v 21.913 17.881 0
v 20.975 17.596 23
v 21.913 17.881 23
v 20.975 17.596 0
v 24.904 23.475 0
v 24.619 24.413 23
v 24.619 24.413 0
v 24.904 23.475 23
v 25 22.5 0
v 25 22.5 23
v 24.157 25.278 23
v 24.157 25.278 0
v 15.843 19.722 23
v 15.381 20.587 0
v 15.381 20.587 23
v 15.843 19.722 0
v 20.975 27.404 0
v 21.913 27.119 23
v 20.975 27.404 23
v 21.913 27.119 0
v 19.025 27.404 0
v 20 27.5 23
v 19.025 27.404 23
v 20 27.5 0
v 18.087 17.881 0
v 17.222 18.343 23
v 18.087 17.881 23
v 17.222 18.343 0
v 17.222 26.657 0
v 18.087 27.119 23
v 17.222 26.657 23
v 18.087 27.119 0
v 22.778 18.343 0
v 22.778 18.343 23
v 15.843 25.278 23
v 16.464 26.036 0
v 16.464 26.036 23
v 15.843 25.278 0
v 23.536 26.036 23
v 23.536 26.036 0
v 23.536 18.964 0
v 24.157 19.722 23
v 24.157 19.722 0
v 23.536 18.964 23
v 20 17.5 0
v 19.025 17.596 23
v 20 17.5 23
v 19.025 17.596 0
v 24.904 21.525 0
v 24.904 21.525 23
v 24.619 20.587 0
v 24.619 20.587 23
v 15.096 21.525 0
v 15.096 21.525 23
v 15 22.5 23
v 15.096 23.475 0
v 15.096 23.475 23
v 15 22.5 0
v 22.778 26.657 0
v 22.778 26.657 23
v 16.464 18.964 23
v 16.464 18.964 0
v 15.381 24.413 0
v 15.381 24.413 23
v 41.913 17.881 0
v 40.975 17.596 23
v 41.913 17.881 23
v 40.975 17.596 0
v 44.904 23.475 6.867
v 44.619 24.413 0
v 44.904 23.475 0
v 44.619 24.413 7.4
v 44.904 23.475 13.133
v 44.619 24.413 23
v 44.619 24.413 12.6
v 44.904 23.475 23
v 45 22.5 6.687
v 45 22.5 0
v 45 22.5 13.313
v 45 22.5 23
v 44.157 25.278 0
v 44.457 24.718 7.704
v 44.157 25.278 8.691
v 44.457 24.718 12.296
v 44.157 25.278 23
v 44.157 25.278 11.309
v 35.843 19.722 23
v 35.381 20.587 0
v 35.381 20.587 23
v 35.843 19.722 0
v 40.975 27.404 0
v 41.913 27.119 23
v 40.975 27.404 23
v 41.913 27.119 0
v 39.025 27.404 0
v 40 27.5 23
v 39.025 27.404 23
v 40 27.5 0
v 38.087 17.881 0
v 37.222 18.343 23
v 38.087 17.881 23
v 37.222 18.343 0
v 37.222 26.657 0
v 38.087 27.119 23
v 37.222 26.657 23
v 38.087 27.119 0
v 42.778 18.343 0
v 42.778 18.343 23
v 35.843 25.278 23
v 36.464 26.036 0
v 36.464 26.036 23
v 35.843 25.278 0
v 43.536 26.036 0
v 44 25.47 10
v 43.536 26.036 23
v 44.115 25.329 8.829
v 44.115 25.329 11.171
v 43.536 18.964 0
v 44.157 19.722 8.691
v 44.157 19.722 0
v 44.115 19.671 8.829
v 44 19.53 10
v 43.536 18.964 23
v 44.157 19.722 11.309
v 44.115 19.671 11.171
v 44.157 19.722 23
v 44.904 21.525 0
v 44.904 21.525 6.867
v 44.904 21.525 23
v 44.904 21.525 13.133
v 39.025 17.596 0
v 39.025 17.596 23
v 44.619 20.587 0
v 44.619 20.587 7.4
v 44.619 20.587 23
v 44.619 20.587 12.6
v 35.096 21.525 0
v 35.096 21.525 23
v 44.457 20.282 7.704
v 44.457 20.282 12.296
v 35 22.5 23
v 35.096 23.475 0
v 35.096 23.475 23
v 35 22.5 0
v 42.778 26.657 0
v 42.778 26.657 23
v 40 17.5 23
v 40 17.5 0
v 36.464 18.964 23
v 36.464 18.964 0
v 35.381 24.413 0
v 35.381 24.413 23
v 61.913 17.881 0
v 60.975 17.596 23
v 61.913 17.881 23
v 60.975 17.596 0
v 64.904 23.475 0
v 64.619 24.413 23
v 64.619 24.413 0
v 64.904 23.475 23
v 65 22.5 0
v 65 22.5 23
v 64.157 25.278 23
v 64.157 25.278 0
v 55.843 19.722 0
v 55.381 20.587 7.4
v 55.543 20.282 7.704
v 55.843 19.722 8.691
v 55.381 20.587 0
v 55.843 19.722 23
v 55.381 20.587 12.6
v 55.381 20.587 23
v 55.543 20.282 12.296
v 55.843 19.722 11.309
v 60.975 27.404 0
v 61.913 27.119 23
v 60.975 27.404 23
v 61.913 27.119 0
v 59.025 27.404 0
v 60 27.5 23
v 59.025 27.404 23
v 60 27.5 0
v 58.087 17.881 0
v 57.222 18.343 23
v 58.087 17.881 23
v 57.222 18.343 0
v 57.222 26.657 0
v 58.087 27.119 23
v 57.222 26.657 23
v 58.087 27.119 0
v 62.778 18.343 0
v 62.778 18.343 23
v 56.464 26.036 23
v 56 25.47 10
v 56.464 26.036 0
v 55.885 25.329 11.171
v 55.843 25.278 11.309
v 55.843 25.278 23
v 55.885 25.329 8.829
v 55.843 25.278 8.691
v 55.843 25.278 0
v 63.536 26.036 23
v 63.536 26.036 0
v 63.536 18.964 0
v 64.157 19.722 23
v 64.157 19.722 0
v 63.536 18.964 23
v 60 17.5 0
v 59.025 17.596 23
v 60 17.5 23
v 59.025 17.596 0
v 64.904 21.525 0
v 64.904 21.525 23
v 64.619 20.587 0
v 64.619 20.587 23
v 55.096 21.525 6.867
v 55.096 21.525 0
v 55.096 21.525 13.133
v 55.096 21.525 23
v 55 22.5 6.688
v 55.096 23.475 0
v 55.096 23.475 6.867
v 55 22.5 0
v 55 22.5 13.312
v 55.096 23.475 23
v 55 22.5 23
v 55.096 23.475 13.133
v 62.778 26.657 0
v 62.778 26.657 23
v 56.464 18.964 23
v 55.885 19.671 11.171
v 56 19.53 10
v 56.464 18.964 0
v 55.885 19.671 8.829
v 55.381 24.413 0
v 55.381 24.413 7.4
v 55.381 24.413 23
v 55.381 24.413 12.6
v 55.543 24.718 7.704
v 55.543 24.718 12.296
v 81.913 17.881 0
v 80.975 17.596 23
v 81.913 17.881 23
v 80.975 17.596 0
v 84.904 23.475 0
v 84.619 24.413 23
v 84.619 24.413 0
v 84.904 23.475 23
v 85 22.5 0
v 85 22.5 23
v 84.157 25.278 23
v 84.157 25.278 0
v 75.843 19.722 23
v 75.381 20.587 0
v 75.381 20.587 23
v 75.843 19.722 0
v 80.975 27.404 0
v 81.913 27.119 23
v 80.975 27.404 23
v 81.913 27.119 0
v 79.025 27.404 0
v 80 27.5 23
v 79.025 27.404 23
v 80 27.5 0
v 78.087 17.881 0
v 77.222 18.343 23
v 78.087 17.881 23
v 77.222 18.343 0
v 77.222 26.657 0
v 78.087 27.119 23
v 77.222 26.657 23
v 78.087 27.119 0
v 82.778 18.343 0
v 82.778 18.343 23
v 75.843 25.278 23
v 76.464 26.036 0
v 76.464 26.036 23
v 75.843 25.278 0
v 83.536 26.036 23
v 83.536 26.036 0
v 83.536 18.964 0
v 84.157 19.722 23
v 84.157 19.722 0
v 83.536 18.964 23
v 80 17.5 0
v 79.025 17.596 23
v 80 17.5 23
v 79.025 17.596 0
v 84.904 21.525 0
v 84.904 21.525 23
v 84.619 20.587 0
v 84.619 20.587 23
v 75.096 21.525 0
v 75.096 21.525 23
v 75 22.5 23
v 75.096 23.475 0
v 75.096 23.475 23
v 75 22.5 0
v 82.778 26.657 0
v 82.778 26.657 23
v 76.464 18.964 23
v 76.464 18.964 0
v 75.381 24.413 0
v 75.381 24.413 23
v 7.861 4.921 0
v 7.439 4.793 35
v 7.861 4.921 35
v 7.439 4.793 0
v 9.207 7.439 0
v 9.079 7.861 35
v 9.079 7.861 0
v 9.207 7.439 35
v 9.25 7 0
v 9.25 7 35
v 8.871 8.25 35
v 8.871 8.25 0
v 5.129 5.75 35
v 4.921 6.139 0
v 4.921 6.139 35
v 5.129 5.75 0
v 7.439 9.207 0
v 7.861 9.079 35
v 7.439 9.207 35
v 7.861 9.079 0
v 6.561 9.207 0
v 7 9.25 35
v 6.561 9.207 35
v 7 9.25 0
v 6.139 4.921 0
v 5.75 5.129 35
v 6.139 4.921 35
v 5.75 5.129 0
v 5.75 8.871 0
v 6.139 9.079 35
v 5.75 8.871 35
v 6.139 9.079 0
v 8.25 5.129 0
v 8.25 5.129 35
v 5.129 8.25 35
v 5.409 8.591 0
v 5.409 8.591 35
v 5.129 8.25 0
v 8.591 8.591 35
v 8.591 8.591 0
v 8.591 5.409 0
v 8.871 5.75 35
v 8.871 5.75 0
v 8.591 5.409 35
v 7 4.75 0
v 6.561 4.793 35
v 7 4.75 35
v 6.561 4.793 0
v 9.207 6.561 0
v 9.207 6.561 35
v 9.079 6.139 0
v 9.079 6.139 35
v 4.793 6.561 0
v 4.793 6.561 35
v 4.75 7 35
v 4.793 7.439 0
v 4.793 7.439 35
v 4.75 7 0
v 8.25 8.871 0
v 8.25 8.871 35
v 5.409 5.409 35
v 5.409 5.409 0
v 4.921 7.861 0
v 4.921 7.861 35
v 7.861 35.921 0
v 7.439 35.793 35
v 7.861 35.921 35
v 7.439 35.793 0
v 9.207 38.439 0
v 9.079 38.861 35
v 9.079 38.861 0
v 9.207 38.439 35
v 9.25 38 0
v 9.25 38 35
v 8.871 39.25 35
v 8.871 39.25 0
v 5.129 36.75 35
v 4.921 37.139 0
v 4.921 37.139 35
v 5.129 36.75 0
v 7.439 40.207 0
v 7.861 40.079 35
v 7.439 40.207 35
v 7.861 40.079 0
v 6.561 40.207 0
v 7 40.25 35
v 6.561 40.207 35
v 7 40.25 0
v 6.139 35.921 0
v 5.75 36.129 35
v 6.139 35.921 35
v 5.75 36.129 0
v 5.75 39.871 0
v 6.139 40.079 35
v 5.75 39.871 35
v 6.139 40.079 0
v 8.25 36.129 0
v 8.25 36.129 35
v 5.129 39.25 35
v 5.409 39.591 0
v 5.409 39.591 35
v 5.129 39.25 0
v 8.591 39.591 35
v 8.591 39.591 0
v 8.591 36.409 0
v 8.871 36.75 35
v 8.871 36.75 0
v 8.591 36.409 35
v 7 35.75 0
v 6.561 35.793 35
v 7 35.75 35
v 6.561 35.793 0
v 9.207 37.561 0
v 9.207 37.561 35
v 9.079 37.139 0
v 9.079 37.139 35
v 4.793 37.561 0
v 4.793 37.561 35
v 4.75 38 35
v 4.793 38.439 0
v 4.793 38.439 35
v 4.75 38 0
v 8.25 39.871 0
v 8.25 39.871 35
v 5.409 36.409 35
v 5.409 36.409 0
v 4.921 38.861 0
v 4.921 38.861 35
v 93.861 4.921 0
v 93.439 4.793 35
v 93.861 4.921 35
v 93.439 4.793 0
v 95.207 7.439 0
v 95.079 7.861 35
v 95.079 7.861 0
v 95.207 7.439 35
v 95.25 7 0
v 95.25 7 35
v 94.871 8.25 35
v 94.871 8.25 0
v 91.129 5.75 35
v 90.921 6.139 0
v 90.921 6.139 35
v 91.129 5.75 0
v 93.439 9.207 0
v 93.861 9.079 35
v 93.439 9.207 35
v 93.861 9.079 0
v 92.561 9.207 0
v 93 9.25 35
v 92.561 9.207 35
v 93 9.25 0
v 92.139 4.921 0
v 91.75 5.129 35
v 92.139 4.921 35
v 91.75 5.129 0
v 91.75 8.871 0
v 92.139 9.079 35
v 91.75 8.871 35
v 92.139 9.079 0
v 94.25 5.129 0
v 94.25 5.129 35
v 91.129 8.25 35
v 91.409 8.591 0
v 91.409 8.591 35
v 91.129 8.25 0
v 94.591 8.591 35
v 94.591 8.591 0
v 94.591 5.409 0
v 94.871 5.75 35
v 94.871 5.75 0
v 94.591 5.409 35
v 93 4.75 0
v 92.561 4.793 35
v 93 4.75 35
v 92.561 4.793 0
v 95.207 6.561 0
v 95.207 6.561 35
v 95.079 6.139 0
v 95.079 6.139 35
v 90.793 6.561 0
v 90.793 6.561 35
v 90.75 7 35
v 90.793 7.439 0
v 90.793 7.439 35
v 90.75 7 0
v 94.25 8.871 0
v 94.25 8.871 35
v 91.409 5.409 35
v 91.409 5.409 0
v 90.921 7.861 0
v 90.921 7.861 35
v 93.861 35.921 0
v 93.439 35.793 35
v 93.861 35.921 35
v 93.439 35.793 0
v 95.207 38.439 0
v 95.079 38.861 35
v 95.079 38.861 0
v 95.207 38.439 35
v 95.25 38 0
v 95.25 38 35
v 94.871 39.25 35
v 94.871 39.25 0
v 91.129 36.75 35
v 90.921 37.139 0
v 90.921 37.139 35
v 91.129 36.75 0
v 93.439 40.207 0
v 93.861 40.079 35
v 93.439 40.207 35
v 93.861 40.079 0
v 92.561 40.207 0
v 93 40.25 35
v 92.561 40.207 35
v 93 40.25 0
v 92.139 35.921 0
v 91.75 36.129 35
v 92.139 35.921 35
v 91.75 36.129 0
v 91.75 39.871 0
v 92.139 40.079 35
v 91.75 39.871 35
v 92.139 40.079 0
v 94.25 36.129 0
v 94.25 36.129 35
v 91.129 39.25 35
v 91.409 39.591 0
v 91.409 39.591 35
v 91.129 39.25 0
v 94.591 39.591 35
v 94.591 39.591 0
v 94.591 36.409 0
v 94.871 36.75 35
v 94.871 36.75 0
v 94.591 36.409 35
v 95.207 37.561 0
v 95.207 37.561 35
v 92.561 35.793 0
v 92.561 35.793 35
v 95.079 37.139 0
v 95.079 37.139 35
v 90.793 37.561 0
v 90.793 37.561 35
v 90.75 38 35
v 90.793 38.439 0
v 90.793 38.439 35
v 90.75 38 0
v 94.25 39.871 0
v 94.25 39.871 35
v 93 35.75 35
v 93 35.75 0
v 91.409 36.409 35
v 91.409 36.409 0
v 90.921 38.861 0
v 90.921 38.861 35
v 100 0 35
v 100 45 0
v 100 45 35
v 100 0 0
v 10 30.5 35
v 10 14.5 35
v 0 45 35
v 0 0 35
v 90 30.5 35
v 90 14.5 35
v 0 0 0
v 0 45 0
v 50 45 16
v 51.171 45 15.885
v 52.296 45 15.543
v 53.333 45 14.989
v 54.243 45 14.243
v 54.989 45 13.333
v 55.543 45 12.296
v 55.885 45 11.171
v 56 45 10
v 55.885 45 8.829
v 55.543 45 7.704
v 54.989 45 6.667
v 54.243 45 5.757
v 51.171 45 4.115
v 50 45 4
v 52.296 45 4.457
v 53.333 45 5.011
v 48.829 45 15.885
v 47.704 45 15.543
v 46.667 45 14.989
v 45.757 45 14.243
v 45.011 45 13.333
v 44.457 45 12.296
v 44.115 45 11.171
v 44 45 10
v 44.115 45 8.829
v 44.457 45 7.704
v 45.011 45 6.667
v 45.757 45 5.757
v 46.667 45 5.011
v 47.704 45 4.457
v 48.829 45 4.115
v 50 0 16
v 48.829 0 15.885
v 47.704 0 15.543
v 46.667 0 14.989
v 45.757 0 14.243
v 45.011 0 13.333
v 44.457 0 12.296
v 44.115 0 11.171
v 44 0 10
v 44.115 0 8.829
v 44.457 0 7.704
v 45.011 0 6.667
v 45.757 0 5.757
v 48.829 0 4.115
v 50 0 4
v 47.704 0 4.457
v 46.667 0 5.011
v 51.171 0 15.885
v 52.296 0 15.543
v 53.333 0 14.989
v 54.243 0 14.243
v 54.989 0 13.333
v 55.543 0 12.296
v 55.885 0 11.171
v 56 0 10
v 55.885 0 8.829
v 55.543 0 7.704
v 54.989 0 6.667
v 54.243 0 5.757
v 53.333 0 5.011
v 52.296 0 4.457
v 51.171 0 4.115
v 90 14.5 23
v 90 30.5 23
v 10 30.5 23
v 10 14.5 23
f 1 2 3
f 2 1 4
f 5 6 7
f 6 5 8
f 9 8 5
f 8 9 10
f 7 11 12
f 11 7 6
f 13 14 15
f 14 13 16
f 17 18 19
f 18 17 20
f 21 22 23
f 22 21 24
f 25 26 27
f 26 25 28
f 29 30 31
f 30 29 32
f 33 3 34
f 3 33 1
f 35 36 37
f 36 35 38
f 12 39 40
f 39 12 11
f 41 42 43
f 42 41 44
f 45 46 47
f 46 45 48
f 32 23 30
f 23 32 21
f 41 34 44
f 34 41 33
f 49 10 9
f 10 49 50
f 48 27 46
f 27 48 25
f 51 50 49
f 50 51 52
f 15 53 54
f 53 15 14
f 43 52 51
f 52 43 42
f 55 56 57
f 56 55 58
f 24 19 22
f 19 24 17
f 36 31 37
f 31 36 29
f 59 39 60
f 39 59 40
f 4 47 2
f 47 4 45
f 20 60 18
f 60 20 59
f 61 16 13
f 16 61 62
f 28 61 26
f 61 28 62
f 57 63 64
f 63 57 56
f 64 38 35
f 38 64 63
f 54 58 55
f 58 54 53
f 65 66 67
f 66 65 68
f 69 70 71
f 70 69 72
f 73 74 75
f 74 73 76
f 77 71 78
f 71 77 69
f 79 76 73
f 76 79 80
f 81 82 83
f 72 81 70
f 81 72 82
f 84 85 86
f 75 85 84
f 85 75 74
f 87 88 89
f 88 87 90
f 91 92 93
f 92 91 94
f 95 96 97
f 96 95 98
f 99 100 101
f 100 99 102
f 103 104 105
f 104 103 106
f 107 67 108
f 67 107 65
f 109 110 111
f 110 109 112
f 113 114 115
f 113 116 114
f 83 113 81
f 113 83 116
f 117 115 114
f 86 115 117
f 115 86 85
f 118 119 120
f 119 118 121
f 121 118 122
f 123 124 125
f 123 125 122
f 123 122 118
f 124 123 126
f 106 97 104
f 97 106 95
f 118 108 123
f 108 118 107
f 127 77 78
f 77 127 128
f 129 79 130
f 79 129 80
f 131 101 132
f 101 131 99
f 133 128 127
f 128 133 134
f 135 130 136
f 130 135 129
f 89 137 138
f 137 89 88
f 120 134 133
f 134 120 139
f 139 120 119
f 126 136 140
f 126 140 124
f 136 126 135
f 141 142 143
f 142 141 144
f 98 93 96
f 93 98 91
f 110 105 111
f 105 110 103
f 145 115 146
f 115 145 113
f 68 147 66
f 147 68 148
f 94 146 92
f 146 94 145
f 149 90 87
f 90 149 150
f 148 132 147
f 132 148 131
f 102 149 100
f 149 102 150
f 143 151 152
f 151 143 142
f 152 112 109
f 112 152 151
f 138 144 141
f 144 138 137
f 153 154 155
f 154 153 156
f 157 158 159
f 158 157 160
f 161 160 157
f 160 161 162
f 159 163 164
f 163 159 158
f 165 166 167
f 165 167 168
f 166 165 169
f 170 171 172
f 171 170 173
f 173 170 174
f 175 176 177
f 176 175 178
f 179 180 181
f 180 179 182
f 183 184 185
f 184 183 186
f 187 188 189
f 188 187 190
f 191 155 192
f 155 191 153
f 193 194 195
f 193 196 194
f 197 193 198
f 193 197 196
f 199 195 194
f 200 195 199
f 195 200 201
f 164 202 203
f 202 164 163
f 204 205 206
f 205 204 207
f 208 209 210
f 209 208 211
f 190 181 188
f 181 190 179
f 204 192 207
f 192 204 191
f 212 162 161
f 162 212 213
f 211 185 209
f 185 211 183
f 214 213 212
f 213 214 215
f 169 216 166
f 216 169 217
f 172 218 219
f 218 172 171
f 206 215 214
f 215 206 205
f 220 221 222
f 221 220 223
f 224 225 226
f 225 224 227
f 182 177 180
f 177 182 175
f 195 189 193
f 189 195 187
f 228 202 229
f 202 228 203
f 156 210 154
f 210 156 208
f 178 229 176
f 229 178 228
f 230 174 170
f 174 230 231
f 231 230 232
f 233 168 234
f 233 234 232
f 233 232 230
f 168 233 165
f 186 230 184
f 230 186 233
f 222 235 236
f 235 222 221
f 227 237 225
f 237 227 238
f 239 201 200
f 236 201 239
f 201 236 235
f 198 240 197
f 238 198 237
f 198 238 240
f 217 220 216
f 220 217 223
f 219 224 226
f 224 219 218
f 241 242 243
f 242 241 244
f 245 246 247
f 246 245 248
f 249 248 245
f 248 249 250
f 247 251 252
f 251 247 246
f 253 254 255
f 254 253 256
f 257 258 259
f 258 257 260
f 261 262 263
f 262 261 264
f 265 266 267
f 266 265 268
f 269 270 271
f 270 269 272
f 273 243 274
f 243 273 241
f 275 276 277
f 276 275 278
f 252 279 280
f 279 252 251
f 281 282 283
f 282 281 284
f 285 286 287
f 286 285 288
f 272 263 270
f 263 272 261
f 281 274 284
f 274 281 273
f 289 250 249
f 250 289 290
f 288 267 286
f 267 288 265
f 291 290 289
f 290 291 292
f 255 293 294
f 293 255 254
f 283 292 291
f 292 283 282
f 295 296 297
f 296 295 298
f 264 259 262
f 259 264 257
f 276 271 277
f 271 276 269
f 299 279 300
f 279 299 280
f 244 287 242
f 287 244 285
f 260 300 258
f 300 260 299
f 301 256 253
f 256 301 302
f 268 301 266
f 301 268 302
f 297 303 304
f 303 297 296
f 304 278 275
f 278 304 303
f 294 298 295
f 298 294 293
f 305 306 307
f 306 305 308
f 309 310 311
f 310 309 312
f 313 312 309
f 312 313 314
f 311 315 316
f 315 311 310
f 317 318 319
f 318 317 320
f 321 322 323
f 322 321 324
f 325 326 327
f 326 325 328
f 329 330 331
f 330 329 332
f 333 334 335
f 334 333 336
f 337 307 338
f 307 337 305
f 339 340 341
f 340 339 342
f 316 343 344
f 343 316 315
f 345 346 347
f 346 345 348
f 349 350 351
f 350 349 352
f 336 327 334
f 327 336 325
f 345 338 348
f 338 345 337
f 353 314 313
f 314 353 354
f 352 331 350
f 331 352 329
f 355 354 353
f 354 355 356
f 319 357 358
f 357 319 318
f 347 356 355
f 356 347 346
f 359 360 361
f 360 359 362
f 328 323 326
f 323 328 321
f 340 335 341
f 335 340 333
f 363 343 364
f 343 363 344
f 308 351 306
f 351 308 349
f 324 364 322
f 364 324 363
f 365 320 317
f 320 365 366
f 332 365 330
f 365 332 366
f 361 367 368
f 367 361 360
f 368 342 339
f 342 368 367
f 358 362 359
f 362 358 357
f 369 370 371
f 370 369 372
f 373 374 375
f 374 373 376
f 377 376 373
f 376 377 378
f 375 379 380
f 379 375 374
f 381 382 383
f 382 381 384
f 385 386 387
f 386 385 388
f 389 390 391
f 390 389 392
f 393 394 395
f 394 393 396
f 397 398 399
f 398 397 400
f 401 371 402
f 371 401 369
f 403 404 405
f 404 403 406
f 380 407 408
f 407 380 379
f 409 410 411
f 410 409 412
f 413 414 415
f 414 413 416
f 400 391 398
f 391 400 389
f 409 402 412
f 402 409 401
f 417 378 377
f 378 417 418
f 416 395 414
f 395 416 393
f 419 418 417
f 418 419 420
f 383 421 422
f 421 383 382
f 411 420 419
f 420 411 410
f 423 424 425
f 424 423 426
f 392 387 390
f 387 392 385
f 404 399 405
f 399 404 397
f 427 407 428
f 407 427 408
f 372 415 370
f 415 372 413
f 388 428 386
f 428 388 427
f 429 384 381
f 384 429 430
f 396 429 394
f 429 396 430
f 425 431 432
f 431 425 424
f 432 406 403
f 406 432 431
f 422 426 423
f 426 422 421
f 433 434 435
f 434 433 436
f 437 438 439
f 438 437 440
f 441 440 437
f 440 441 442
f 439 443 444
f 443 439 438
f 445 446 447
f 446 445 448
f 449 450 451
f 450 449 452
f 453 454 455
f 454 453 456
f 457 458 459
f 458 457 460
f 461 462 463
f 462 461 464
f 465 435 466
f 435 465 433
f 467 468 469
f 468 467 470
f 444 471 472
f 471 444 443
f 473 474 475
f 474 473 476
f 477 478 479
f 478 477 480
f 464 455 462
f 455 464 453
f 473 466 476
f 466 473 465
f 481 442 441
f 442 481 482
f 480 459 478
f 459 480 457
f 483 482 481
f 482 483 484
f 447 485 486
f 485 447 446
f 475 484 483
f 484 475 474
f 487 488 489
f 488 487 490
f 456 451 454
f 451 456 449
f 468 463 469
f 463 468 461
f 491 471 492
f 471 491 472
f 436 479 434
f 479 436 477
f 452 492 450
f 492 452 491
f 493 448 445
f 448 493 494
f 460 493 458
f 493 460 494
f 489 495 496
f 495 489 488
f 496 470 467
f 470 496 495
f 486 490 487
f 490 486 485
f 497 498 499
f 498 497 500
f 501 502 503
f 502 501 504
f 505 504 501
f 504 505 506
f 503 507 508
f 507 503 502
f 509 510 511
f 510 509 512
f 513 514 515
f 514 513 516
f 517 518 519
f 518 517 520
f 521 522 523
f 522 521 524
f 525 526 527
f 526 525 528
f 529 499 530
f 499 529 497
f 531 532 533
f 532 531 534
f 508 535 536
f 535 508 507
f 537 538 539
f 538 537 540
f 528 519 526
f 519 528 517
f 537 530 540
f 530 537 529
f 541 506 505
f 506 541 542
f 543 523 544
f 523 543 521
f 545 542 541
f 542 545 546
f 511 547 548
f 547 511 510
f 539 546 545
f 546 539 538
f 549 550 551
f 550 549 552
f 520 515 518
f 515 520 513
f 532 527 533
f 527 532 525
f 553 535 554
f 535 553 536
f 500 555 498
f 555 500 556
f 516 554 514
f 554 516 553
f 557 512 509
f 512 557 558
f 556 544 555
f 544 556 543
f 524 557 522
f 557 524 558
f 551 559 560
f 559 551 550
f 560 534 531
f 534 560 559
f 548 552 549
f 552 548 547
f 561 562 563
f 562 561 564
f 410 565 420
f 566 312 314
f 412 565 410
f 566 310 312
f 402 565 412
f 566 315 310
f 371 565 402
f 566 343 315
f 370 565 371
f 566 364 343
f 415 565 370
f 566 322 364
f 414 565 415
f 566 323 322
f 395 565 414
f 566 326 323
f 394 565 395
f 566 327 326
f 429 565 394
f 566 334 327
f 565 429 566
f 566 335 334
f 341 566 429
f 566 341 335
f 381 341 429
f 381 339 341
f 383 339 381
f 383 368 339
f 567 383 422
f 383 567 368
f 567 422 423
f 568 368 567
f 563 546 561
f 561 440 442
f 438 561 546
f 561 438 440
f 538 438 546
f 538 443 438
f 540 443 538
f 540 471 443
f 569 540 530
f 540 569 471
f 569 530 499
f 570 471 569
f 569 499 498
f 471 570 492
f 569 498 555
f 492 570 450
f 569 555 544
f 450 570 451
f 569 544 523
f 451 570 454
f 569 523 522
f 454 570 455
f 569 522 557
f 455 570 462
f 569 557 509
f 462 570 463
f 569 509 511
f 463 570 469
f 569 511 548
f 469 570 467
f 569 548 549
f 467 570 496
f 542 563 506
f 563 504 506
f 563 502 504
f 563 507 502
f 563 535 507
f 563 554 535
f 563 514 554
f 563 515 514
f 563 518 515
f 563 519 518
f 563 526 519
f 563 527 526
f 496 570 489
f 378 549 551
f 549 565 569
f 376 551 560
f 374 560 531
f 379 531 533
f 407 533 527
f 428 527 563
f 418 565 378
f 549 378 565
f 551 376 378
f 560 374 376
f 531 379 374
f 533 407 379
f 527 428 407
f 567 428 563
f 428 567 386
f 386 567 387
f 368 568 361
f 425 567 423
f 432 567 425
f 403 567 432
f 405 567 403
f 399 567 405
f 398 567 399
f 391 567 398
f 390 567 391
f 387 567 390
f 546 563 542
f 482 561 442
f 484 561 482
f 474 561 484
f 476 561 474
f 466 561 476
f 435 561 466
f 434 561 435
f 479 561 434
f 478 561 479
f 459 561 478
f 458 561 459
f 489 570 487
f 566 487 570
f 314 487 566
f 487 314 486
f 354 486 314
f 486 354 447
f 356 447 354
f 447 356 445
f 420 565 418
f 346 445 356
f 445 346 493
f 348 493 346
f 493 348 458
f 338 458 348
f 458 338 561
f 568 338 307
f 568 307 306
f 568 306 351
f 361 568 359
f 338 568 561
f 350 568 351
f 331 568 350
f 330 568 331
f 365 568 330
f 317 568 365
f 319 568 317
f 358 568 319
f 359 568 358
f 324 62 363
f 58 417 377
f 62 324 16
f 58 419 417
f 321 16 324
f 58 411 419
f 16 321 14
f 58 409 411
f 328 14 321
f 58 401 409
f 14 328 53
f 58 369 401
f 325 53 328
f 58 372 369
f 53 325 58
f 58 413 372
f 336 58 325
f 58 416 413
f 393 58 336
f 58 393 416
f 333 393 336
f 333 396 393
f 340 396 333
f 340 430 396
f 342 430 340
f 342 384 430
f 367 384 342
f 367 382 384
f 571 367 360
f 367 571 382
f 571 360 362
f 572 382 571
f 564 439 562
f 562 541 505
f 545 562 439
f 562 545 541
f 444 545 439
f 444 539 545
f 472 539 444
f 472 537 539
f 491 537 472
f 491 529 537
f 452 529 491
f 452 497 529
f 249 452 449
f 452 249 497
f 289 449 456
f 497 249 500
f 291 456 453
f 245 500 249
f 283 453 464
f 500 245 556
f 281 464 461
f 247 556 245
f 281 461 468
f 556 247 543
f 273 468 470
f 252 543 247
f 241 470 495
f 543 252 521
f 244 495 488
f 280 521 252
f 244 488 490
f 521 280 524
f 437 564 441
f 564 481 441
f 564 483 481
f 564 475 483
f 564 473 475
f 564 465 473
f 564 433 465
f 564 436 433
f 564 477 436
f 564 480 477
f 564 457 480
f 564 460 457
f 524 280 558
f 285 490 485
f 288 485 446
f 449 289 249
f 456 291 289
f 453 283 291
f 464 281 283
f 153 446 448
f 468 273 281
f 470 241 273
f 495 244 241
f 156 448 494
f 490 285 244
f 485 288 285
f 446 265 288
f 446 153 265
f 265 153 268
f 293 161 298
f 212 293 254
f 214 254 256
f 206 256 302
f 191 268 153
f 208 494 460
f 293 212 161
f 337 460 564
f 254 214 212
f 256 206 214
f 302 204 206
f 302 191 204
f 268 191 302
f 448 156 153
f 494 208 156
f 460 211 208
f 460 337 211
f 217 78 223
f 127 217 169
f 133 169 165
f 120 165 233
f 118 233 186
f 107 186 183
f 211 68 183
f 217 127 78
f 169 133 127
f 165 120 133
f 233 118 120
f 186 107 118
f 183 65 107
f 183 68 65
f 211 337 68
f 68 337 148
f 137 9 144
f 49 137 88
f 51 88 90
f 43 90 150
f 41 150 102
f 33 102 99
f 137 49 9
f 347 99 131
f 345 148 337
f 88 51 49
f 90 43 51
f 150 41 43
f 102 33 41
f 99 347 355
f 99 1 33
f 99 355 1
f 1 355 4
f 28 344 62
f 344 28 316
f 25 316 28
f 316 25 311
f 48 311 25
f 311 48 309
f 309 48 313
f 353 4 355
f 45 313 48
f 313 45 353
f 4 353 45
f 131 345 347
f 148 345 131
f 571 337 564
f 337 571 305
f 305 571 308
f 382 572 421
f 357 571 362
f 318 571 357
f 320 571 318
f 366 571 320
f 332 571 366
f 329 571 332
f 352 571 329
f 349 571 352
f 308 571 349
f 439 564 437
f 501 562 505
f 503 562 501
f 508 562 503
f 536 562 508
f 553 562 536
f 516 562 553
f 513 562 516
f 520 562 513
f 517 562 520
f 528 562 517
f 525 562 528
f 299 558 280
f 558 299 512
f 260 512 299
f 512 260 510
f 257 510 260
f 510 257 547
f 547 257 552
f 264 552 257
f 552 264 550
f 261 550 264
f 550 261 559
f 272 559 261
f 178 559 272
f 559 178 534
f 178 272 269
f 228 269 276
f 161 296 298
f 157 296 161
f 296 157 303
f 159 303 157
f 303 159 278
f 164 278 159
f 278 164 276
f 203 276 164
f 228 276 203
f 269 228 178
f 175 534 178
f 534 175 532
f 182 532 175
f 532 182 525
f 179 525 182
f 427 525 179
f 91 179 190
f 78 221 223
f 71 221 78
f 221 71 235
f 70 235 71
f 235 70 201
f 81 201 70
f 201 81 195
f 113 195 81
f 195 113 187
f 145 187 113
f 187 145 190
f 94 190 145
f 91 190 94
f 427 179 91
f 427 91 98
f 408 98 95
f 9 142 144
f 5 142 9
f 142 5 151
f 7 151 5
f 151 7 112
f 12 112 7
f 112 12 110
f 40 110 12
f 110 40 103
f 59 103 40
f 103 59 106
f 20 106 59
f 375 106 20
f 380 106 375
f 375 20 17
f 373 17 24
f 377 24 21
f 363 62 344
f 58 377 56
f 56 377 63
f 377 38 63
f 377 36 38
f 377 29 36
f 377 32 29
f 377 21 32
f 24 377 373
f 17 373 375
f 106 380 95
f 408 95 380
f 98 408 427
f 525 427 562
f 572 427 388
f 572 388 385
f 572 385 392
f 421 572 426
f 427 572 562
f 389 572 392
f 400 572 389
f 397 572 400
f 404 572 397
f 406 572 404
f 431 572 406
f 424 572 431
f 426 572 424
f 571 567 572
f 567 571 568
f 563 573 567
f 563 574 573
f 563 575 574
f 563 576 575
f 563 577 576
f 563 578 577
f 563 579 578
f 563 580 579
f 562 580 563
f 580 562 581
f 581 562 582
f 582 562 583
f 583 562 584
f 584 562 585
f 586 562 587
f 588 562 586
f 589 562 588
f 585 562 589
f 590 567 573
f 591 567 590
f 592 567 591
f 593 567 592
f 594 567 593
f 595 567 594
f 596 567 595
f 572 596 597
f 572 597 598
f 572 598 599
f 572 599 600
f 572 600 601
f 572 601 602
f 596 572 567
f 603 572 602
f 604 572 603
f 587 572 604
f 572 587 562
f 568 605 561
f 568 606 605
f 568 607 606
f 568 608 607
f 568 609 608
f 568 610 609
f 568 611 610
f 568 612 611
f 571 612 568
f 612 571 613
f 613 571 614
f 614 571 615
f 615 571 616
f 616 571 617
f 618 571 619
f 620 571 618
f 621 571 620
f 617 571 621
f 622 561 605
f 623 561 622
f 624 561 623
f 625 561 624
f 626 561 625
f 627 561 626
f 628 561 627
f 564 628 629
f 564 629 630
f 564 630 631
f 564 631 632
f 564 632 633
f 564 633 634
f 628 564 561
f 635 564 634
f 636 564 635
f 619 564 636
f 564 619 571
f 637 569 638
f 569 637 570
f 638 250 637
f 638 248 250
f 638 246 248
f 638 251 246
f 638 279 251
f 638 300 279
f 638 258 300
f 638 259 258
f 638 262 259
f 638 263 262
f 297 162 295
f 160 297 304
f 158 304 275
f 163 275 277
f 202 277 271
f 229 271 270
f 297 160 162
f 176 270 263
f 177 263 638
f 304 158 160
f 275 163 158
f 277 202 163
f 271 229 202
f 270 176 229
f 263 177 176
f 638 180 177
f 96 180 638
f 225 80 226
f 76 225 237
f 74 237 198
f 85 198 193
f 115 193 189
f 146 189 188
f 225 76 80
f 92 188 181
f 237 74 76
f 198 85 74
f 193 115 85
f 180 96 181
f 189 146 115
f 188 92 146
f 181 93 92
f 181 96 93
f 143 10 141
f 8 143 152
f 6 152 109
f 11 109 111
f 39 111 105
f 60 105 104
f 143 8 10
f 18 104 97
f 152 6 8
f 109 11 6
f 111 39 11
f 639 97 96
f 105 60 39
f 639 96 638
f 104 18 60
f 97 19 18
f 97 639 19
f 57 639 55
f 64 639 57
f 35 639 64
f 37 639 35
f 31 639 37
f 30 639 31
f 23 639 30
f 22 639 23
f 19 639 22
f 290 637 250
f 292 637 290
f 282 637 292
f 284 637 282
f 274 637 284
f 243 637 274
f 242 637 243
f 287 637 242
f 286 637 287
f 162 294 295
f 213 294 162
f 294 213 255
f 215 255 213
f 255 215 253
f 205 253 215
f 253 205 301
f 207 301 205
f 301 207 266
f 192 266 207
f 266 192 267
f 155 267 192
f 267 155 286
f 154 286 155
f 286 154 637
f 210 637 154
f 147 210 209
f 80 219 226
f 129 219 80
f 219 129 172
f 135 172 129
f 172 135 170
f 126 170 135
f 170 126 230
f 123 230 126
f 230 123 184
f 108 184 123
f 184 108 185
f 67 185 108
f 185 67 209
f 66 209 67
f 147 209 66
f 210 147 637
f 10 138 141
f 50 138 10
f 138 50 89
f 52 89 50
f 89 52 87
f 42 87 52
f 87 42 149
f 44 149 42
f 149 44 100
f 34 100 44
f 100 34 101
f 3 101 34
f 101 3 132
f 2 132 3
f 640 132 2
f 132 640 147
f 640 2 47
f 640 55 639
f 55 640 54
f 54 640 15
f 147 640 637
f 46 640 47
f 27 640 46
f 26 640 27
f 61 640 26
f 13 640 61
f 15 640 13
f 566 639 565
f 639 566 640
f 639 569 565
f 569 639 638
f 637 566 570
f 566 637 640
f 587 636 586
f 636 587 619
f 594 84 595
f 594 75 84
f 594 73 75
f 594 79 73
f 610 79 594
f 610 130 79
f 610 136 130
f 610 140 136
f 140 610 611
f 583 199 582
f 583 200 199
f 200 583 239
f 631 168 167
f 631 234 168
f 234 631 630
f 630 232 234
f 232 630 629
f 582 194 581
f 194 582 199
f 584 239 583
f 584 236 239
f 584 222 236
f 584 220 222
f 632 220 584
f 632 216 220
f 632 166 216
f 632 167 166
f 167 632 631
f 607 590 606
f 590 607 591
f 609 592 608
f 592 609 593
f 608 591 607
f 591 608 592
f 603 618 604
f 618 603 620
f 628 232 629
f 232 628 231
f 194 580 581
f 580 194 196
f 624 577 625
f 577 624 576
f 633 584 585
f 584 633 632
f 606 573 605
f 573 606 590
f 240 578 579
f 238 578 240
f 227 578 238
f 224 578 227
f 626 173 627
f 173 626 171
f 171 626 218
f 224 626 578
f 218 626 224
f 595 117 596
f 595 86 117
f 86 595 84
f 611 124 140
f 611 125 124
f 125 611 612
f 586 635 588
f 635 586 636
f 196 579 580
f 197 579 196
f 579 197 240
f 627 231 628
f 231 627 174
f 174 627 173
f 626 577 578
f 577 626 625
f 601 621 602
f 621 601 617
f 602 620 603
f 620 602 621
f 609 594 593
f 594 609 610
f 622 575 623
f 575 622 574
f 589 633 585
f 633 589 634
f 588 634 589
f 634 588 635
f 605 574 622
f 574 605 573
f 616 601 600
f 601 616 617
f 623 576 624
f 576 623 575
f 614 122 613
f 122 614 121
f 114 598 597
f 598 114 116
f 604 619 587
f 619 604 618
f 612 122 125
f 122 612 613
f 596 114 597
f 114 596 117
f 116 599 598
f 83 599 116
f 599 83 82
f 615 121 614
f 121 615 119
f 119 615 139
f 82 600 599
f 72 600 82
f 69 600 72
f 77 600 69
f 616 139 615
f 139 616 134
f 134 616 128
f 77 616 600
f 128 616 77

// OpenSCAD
$fn = 32;

// ----------------------------------------------------------------------
// Manifold block: side_outlet manifold
// ----------------------------------------------------------------------

// --- parameters (mm) ---
block_l = 100;            // block length, X
block_w = 45;             // block width, Y
block_h = 35;             // block height, Z
port_d = 10;              // port bore diameter
port_pitch = 20;          // port pitch along X
gallery_d = 16;           // top gallery width, Y
gallery_depth = 12;       // gallery pocket depth
wall_p = 10;              // gallery end wall thickness, X
mnt_d = 4.5;              // mounting hole diameter
mnt_in = 7;               // mounting hole inset from the edges
out_d = 12;               // outlet bore diameter
out_z = 10;               // outlet axis height

n_ports = 4;  // ports in the row
port_x0 = (block_l - (n_ports - 1) * port_pitch) / 2;  // first port X

difference() {
  cube([block_l, block_w, block_h]);
  for (i = [0 : n_ports - 1])
    translate([port_x0 + i * port_pitch, block_w / 2, -1])
      cylinder(h = block_h + 2, d = port_d);
  translate([wall_p, block_w / 2 - gallery_d / 2, block_h - gallery_depth])
    cube([block_l - 2 * wall_p, gallery_d, gallery_depth + 1]);
  for (cx = [mnt_in, block_l - mnt_in])
    for (cy = [mnt_in, block_w - mnt_in])
      translate([cx, cy, -1]) cylinder(h = block_h + 2, d = mnt_d);
  translate([block_l / 2, -1, out_z]) rotate([-90, 0, 0])
    cylinder(h = block_w + 2, d = out_d);
}
